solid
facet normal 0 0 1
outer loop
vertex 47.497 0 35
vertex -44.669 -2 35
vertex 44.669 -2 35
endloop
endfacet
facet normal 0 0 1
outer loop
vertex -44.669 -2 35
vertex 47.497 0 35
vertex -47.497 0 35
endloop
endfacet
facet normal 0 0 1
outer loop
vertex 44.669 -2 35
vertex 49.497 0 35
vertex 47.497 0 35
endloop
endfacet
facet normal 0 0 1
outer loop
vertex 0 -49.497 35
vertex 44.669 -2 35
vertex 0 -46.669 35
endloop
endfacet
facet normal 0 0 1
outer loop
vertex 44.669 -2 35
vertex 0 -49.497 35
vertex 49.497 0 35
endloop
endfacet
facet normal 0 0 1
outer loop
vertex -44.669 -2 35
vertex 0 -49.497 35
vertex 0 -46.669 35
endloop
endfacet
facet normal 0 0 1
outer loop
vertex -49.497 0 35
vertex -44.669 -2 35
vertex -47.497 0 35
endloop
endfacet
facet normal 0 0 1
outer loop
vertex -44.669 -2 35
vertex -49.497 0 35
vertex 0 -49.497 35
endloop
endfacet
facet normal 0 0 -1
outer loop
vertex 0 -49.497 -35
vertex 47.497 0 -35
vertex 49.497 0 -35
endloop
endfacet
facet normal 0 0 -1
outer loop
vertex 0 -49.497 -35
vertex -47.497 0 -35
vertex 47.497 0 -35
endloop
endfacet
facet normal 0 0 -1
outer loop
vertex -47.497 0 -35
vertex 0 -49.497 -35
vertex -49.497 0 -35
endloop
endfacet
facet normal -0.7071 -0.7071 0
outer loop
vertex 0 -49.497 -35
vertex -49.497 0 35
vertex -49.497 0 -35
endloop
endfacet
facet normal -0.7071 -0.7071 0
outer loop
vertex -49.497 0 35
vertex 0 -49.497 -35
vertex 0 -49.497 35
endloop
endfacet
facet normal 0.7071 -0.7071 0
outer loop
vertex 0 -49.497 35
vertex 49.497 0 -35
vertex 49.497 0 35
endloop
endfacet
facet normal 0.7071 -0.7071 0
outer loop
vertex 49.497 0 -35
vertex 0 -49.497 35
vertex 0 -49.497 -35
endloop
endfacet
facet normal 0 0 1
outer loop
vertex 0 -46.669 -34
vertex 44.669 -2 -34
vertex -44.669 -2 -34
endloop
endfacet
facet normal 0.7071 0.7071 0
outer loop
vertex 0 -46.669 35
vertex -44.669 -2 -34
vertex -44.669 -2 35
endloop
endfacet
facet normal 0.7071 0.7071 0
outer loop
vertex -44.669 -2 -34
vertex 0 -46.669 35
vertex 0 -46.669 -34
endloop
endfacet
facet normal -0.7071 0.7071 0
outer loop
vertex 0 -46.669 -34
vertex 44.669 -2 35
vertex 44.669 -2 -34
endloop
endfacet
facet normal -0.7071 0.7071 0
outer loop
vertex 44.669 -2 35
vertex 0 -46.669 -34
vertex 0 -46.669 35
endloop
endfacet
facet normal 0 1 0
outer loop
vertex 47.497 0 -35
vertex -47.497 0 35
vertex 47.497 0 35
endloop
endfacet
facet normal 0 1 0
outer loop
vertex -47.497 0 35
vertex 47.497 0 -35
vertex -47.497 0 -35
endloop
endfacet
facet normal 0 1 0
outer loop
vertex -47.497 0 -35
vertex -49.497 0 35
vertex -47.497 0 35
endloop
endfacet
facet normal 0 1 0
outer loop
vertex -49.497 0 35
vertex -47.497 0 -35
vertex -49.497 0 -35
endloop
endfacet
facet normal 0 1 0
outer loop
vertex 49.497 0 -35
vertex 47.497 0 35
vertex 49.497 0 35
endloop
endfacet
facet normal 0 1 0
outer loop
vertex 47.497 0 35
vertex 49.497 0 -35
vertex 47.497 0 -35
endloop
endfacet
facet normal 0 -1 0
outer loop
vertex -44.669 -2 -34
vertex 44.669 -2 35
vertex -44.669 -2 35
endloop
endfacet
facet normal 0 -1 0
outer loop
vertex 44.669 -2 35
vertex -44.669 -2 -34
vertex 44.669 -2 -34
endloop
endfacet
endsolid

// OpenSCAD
$fn = 50;

module halfcube(size, height, thickness) {
    l = sqrt(size*size + size*size);
    l2 = l-(thickness * 2);

    translate([-l2/2, -thickness, -height/2]) cube([l2, thickness, height]);
    difference() {
        rotate(45) {
            difference() {
                cube([size, size, height], center=true);
                translate([0, 0, 1]) {
                    cube([size-(thickness*2), size-(thickness*2), height],
                         center=true);
                }
            }
        }
        translate([-l/2, 0, -l]) {
            cube([l, l, height+l]);
        }
    }
}

halfcube(70, 70, 2);
